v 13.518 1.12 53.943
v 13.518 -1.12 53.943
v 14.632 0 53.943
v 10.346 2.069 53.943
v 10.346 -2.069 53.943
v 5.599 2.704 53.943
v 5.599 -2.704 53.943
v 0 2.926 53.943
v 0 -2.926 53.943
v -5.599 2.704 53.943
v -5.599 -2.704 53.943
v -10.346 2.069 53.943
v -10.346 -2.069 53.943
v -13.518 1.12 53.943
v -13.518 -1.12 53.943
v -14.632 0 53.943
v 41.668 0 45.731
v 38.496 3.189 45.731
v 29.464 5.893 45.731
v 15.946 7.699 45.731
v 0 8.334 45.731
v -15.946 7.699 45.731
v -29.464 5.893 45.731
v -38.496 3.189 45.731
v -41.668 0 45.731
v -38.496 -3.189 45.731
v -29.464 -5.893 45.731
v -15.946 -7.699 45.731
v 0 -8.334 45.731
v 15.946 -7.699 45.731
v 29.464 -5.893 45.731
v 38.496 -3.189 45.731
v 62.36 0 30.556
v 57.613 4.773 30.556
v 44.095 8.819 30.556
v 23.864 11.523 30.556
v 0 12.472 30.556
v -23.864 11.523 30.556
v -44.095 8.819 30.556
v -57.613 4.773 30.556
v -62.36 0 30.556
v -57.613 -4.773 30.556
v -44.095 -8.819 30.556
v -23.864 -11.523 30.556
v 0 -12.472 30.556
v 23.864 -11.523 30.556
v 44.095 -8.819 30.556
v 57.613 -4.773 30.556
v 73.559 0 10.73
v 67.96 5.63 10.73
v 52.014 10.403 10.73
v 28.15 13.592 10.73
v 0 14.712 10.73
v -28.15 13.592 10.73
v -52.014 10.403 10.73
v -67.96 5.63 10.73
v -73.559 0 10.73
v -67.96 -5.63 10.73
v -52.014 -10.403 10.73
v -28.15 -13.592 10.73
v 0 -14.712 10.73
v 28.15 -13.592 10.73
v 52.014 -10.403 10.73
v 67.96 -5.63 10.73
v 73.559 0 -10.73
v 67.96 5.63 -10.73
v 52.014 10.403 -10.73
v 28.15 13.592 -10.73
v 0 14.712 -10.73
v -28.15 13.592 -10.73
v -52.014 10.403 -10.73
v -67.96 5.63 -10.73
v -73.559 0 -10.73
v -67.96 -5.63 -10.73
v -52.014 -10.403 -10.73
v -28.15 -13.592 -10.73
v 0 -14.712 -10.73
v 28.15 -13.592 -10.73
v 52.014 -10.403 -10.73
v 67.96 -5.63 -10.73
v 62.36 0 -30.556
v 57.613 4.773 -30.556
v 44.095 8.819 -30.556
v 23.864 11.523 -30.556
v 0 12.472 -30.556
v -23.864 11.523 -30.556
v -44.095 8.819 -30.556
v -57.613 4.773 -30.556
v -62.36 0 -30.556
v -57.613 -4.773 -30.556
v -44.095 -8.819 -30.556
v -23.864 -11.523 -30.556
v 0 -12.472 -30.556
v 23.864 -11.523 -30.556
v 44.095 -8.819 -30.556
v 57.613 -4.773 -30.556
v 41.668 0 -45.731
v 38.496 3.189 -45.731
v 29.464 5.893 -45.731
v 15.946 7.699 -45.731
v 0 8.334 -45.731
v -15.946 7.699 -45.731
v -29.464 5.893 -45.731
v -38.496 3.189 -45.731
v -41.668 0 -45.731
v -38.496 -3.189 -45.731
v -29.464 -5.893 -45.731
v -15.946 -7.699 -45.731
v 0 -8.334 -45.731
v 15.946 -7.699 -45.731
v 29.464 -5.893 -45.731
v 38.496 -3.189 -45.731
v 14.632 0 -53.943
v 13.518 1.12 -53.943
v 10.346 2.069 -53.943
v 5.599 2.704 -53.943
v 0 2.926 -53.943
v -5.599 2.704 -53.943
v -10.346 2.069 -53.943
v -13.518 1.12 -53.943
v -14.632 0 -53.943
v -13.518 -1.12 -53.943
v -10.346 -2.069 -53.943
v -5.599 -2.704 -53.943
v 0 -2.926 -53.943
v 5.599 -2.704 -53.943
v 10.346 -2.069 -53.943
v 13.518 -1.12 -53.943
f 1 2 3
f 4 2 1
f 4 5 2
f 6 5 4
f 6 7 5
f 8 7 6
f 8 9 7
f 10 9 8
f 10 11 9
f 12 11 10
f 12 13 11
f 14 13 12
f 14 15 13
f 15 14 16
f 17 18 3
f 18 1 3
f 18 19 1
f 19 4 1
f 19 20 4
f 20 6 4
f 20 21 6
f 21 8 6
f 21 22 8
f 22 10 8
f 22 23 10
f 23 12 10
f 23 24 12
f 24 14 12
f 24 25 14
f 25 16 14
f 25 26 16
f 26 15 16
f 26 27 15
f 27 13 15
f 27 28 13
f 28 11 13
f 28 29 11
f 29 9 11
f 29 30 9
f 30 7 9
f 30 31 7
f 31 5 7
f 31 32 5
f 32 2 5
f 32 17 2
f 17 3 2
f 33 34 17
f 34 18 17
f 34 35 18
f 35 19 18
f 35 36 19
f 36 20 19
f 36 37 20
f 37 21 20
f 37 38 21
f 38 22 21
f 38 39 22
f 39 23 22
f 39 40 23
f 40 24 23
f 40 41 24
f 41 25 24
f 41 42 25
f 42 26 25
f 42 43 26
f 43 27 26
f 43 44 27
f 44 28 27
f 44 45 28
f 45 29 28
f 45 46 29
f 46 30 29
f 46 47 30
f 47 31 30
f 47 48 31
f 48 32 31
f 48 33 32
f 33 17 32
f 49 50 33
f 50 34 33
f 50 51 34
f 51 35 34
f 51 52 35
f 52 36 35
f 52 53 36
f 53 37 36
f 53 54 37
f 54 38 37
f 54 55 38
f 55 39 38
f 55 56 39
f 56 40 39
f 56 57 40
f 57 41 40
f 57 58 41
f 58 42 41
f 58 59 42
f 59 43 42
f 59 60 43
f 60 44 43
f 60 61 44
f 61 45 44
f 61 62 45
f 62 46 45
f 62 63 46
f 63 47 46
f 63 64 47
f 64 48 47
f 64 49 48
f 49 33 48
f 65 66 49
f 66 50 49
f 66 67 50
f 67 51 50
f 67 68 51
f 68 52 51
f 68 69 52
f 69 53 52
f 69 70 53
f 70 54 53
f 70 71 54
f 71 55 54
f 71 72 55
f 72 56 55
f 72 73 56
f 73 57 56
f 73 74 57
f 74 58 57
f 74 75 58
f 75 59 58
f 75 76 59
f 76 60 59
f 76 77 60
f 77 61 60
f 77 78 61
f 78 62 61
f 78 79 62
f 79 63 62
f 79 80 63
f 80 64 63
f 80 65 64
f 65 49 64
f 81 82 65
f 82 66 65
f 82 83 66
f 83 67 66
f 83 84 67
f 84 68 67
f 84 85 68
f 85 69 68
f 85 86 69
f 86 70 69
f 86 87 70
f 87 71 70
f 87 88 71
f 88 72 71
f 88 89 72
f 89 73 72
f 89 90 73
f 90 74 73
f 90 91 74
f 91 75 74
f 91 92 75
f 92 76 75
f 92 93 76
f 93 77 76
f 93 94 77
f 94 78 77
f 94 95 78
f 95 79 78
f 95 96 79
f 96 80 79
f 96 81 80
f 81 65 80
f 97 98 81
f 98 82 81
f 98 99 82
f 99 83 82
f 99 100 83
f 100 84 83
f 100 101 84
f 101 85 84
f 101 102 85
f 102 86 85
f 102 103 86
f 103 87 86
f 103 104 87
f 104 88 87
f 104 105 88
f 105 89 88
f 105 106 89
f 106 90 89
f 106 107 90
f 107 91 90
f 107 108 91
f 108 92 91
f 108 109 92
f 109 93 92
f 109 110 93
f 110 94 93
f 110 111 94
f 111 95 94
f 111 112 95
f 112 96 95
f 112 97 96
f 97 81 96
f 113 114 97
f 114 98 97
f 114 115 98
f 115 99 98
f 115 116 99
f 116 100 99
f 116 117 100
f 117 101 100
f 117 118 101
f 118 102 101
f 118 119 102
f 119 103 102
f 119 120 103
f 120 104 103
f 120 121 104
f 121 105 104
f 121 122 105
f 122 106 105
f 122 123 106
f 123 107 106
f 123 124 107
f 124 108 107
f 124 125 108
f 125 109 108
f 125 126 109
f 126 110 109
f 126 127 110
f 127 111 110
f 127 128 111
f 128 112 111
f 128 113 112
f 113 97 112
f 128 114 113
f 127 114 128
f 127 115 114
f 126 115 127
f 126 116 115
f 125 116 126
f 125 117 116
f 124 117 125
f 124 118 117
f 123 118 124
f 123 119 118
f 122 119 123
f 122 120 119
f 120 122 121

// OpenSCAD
// Generated by SolidPython 1.0.1 on 2020-07-29 00:46:51


scale(v = [15, 3, 11]) {
	sphere(r = 5);
}
/***********************************************
*********      SolidPython code:      **********
************************************************
 
# import packages: SolidPython
from solid import *
from solid.utils import *
from itertools import chain, combinations, permutations


class Resize:

    def __init__(self, scad_file):
        self.scad_file = scad_file
        #self.scad_file = import_scad(scad_file)
        # cone/cylinder param:
        self.r1 = 0
        self.r2 = 0
        self.h = 0
        # rectangular prism param:
        self.w = 0
        self.l = 0
        # ellipse param:
        self.r = 0

    # import OpenScad code (file name corresponds to shape)


    # classify shape + parameters
    def assign(self, param1, param2, param3):
        if self.scad_file == 'cone.scad':
            self.r1 = param1
            self.r2 = param2
            self.h = param3
        elif self.scad_file == 'cylinder.scad':
            self.r1 = param1
            self.r2 = param2
            self.h = param3
        elif self.scad_file == 'rectangularPrism.scad':
            self.h = param1
            self.l = param2
            self.w = param3
        else:
            self.r = param1
            self.h = param2

    # resize parameters
    def iterate(self):
        x = range(3, 20, 2)
        i = 1
        if self.scad_file == 'cone.scad':
            tempList = list(permutations(x, 2))
            for temp in tempList:
                param1 = temp[0]
                param2 = temp[1]
                filepath = 'produced_scad_files/' + 'cone' + str(param1) + '_' + str(param2) + '_' + '.scad'
                scad_render_to_file(cylinder(h=param1, r1=param2, r2=0), filepath)

        elif self.scad_file == 'cylinder.scad':
            tempList = list(permutations(x, 3))
            for temp in tempList:
                param1 = temp[0]
                param2 = temp[1]
                filepath = 'produced_scad_files/' + 'cylinder' + str(param1) + '_' + str(param2) + '_' + '.scad'
                scad_render_to_file(cylinder(h=param1, r1=param2, r2=param2), filepath)

        elif self.scad_file == 'rectangularPrism.scad':
            tempList = list(permutations(x, 3))
            for temp in tempList:
                param1 = temp[0]
                param2 = temp[1]
                param3 = temp[2]
                filepath = 'produced_scad_files/' + 'rectangularPrism' + str(param1) + '_' + str(param2) + '_' + str(
                    param3) + '.scad'
                scad_render_to_file(cube(size=(param1, param2, param3)), filepath)

        elif self.scad_file == 'ellipse.scad':
            tempList = list(permutations(x, 4))
            for temp in tempList:
                param1 = temp[0]
                param2 = temp[1]
                param3 = temp[2]
                param4 = temp[3]
                filepath = 'produced_scad_files/' + 'ellipse' + str(param1) + '_' + str(param2) + '_' + str(param3) + '_' + str(param4) + '.scad'
                scad_render_to_file(scale([param1, param2, param3])(sphere(r=param4)), filepath)

    def render_to_scadfile(self):
        scad_render_to_file(scad, 'example.scad') 
 
************************************************/
